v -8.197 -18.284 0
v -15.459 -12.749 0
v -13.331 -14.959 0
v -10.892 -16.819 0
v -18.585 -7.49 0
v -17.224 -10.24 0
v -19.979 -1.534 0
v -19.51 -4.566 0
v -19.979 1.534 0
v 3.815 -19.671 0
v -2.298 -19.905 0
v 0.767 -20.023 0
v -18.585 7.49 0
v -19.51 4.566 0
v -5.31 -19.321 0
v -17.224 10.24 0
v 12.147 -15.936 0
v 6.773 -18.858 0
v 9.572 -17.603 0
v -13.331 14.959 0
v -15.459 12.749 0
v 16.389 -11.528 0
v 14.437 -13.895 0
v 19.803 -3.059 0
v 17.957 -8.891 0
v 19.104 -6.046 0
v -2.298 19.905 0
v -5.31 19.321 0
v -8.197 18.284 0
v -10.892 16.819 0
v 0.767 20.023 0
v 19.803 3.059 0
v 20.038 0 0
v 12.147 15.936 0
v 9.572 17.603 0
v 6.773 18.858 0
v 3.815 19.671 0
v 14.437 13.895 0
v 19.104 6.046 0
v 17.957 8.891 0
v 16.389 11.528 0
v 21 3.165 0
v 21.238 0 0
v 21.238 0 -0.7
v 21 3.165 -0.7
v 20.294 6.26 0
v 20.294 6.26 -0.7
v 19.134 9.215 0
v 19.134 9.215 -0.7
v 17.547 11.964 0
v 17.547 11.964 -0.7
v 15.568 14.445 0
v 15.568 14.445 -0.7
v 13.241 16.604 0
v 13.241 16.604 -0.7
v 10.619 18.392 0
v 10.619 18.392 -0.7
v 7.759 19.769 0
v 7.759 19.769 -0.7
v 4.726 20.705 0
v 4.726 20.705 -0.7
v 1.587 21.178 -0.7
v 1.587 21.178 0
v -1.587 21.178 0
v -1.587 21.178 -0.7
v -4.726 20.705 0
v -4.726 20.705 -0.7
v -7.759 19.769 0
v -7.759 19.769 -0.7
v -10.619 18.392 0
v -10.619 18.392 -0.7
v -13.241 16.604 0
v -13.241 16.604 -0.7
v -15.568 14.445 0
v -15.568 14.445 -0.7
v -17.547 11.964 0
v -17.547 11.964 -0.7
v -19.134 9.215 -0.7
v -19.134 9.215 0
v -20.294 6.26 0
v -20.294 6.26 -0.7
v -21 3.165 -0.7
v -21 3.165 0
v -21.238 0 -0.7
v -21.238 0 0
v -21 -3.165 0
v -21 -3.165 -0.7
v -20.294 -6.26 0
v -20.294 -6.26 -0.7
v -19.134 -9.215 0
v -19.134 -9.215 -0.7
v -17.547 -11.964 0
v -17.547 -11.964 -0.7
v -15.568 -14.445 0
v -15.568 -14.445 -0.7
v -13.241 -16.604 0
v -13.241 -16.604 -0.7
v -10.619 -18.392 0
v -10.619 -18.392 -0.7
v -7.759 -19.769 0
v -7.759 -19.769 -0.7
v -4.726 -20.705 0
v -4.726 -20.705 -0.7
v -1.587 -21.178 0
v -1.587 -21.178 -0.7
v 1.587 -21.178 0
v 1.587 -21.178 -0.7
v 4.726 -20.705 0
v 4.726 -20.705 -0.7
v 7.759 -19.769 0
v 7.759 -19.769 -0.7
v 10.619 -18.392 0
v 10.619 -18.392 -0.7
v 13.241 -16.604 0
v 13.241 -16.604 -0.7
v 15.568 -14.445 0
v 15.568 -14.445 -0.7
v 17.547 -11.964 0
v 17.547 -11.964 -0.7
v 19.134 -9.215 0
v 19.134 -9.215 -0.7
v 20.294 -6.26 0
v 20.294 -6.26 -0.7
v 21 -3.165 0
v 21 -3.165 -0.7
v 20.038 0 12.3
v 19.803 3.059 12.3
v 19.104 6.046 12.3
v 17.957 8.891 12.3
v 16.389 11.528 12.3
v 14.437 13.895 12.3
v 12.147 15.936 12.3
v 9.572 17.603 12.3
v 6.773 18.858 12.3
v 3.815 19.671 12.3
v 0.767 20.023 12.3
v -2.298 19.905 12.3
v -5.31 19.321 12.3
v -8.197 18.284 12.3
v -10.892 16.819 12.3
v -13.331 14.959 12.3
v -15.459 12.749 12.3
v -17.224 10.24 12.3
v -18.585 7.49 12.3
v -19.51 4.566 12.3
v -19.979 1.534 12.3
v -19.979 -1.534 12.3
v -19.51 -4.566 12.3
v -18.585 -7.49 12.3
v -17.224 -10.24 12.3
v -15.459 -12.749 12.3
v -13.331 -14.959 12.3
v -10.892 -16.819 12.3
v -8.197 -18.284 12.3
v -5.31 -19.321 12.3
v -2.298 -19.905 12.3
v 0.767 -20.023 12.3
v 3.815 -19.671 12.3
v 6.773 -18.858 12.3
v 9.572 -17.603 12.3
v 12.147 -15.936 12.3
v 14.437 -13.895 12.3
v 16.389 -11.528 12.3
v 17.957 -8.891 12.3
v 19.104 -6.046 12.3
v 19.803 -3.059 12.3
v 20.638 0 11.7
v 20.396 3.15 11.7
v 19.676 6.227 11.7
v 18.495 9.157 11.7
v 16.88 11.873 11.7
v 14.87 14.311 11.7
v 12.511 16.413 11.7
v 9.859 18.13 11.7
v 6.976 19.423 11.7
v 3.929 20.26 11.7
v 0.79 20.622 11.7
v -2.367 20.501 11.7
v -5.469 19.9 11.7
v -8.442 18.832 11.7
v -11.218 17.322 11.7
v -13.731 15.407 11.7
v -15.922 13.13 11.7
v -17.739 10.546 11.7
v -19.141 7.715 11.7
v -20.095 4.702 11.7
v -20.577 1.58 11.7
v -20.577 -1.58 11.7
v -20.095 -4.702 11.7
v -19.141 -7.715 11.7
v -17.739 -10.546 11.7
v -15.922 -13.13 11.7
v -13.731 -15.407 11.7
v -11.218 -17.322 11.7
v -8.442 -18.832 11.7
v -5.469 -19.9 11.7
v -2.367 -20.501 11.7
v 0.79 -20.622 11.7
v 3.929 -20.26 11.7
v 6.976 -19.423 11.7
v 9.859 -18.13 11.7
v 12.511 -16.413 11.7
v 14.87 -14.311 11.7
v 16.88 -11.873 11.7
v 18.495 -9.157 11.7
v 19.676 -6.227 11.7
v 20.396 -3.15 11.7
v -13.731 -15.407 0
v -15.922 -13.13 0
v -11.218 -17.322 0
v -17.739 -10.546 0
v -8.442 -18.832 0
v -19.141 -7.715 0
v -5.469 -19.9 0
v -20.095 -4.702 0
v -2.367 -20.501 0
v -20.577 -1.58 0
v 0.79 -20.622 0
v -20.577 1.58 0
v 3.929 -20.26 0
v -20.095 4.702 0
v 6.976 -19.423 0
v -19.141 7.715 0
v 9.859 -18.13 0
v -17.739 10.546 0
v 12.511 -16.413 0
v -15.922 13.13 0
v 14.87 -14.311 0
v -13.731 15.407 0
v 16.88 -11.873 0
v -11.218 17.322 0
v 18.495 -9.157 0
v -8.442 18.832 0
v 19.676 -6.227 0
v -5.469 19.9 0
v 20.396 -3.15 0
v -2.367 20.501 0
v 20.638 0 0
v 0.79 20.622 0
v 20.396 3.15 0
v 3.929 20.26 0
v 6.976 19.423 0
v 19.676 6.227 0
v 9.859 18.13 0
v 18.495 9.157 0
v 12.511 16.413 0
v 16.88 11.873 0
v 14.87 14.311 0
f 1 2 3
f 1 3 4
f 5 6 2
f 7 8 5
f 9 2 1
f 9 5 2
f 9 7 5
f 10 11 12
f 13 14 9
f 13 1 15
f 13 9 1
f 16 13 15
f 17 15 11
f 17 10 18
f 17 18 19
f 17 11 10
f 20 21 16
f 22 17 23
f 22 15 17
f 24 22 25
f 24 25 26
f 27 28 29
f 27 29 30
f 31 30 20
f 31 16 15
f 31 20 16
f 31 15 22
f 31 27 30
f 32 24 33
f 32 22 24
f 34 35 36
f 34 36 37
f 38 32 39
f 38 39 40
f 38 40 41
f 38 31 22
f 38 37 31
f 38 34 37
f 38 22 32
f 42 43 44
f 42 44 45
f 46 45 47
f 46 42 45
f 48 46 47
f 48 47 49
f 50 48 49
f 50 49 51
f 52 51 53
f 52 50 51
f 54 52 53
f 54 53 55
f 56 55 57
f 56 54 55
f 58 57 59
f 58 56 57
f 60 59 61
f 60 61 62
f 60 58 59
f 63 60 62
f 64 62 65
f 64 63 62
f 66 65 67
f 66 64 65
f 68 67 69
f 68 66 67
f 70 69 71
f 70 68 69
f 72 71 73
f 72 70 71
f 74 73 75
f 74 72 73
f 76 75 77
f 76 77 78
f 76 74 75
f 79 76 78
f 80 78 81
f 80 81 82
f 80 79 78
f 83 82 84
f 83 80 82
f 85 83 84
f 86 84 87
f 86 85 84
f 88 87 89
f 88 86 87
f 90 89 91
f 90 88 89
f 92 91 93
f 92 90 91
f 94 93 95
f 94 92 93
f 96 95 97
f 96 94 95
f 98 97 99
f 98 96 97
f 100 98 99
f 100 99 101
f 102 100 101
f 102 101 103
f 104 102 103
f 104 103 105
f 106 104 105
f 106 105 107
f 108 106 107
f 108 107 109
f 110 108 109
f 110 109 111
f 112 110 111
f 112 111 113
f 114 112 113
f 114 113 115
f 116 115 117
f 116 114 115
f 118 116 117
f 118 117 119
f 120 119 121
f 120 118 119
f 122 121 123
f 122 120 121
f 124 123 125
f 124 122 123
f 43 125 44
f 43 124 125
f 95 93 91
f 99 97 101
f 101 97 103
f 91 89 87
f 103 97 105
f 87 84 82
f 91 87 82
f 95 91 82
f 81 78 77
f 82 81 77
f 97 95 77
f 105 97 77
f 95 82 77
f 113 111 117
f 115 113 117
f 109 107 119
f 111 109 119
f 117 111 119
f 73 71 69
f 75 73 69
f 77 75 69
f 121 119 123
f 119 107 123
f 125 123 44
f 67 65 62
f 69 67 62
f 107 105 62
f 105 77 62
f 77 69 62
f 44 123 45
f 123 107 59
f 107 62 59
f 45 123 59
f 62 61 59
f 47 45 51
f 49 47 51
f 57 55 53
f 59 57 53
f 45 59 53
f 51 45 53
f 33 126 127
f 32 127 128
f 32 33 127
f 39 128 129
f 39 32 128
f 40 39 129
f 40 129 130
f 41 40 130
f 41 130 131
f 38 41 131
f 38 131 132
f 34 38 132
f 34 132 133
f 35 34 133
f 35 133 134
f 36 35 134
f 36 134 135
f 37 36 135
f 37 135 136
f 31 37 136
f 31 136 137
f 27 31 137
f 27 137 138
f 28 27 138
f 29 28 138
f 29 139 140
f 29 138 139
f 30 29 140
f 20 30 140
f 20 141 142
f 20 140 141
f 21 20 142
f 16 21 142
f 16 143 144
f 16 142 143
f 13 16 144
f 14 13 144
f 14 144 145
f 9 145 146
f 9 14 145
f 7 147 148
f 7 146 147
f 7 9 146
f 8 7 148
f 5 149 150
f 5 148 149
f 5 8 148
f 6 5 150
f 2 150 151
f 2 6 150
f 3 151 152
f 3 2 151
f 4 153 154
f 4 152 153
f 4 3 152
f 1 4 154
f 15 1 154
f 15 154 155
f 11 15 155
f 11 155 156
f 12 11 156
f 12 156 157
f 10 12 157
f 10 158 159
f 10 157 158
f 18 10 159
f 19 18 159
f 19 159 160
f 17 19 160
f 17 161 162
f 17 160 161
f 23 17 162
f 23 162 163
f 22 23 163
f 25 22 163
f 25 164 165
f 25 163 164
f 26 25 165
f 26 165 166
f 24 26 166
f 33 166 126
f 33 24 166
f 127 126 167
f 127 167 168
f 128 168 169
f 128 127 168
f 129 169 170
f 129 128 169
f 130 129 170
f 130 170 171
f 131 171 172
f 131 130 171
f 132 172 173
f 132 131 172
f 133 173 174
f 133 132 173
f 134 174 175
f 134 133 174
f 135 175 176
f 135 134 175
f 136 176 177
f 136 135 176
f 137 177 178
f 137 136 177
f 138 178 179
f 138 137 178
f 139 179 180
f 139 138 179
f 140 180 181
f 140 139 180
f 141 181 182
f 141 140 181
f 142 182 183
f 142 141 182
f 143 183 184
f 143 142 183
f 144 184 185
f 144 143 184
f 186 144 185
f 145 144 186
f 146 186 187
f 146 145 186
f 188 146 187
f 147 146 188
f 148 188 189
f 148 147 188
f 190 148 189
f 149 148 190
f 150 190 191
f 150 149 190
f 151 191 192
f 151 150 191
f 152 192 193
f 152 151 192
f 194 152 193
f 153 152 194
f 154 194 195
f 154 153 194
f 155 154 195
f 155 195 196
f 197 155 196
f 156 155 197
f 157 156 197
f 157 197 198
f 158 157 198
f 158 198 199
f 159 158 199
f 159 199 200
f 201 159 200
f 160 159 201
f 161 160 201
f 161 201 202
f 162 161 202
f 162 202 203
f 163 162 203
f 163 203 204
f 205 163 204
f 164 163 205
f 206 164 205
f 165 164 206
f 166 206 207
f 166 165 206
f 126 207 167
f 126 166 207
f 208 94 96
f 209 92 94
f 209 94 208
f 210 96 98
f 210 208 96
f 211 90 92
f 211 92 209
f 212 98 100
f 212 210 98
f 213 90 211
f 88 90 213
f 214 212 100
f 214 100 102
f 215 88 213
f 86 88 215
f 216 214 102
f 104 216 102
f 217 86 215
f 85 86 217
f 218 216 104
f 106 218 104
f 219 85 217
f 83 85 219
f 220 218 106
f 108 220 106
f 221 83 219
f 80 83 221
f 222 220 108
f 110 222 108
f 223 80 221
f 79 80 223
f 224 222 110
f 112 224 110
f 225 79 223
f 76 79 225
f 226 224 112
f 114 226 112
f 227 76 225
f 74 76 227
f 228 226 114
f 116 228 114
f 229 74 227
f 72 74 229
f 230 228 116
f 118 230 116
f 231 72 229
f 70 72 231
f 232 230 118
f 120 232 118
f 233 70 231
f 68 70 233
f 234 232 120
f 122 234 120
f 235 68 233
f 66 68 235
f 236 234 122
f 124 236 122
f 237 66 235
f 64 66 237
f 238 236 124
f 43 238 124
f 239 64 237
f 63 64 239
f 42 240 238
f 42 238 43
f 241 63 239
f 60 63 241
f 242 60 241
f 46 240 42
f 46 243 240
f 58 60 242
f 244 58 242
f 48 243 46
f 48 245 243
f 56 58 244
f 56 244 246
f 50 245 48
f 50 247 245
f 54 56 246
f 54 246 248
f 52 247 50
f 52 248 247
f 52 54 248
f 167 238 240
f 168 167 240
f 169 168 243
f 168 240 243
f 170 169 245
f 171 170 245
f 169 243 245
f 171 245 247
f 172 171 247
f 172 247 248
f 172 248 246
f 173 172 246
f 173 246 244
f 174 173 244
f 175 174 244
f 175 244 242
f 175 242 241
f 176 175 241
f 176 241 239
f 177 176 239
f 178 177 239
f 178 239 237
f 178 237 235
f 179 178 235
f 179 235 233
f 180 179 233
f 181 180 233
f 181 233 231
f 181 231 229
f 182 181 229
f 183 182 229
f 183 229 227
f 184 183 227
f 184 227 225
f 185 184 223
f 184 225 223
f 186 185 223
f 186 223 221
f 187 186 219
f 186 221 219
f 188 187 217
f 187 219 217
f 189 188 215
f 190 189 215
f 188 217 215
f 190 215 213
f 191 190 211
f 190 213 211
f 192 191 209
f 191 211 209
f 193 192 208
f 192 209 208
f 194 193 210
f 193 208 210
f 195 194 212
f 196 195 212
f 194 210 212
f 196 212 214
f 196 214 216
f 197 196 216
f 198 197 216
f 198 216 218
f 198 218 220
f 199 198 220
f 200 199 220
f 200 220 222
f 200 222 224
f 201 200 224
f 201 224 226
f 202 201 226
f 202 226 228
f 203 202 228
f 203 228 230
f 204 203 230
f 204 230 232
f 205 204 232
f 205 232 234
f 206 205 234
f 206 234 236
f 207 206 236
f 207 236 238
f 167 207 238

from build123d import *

# Parameters (mm, degrees)
F0_R     = 20.6375
F0_R_2   = 20.0375
F1_DEPTH = 12.7
F2_R     = 21.2375
F3_DEPTH = 0.7


# Not quite as in the source:
# - a fillet or chamfer that OpenCascade refuses, or shapes differently, is made with other operations: its cross-section is extruded or revolved along the edge and cut away or added


with BuildPart() as f1:
    # F0 (on Top) → F1 (new body)
    with BuildSketch(Plane.XY):
        Circle(F0_R)
        Circle(F0_R_2, mode=Mode.SUBTRACT)
    extrude(amount=F1_DEPTH)

    # F2 (on Top) → F3 (join)
    with BuildSketch(Plane.XY):
        Circle(F2_R)
    extrude(amount=-F3_DEPTH)

    # F4: chamfer of 1 on 1 edges, made by hand

    # F4_s1 → F4_t2 (revolve, cut)
    with BuildSketch(Plane.XZ):
        Polygon((20.6375, 11.7), (19.6375, 12.7), (20.6375, 12.7), align=None)
    revolve(axis=Axis((0, 0, 12.7), (0, 0, 1)), mode=Mode.SUBTRACT)


solid = f1.part
